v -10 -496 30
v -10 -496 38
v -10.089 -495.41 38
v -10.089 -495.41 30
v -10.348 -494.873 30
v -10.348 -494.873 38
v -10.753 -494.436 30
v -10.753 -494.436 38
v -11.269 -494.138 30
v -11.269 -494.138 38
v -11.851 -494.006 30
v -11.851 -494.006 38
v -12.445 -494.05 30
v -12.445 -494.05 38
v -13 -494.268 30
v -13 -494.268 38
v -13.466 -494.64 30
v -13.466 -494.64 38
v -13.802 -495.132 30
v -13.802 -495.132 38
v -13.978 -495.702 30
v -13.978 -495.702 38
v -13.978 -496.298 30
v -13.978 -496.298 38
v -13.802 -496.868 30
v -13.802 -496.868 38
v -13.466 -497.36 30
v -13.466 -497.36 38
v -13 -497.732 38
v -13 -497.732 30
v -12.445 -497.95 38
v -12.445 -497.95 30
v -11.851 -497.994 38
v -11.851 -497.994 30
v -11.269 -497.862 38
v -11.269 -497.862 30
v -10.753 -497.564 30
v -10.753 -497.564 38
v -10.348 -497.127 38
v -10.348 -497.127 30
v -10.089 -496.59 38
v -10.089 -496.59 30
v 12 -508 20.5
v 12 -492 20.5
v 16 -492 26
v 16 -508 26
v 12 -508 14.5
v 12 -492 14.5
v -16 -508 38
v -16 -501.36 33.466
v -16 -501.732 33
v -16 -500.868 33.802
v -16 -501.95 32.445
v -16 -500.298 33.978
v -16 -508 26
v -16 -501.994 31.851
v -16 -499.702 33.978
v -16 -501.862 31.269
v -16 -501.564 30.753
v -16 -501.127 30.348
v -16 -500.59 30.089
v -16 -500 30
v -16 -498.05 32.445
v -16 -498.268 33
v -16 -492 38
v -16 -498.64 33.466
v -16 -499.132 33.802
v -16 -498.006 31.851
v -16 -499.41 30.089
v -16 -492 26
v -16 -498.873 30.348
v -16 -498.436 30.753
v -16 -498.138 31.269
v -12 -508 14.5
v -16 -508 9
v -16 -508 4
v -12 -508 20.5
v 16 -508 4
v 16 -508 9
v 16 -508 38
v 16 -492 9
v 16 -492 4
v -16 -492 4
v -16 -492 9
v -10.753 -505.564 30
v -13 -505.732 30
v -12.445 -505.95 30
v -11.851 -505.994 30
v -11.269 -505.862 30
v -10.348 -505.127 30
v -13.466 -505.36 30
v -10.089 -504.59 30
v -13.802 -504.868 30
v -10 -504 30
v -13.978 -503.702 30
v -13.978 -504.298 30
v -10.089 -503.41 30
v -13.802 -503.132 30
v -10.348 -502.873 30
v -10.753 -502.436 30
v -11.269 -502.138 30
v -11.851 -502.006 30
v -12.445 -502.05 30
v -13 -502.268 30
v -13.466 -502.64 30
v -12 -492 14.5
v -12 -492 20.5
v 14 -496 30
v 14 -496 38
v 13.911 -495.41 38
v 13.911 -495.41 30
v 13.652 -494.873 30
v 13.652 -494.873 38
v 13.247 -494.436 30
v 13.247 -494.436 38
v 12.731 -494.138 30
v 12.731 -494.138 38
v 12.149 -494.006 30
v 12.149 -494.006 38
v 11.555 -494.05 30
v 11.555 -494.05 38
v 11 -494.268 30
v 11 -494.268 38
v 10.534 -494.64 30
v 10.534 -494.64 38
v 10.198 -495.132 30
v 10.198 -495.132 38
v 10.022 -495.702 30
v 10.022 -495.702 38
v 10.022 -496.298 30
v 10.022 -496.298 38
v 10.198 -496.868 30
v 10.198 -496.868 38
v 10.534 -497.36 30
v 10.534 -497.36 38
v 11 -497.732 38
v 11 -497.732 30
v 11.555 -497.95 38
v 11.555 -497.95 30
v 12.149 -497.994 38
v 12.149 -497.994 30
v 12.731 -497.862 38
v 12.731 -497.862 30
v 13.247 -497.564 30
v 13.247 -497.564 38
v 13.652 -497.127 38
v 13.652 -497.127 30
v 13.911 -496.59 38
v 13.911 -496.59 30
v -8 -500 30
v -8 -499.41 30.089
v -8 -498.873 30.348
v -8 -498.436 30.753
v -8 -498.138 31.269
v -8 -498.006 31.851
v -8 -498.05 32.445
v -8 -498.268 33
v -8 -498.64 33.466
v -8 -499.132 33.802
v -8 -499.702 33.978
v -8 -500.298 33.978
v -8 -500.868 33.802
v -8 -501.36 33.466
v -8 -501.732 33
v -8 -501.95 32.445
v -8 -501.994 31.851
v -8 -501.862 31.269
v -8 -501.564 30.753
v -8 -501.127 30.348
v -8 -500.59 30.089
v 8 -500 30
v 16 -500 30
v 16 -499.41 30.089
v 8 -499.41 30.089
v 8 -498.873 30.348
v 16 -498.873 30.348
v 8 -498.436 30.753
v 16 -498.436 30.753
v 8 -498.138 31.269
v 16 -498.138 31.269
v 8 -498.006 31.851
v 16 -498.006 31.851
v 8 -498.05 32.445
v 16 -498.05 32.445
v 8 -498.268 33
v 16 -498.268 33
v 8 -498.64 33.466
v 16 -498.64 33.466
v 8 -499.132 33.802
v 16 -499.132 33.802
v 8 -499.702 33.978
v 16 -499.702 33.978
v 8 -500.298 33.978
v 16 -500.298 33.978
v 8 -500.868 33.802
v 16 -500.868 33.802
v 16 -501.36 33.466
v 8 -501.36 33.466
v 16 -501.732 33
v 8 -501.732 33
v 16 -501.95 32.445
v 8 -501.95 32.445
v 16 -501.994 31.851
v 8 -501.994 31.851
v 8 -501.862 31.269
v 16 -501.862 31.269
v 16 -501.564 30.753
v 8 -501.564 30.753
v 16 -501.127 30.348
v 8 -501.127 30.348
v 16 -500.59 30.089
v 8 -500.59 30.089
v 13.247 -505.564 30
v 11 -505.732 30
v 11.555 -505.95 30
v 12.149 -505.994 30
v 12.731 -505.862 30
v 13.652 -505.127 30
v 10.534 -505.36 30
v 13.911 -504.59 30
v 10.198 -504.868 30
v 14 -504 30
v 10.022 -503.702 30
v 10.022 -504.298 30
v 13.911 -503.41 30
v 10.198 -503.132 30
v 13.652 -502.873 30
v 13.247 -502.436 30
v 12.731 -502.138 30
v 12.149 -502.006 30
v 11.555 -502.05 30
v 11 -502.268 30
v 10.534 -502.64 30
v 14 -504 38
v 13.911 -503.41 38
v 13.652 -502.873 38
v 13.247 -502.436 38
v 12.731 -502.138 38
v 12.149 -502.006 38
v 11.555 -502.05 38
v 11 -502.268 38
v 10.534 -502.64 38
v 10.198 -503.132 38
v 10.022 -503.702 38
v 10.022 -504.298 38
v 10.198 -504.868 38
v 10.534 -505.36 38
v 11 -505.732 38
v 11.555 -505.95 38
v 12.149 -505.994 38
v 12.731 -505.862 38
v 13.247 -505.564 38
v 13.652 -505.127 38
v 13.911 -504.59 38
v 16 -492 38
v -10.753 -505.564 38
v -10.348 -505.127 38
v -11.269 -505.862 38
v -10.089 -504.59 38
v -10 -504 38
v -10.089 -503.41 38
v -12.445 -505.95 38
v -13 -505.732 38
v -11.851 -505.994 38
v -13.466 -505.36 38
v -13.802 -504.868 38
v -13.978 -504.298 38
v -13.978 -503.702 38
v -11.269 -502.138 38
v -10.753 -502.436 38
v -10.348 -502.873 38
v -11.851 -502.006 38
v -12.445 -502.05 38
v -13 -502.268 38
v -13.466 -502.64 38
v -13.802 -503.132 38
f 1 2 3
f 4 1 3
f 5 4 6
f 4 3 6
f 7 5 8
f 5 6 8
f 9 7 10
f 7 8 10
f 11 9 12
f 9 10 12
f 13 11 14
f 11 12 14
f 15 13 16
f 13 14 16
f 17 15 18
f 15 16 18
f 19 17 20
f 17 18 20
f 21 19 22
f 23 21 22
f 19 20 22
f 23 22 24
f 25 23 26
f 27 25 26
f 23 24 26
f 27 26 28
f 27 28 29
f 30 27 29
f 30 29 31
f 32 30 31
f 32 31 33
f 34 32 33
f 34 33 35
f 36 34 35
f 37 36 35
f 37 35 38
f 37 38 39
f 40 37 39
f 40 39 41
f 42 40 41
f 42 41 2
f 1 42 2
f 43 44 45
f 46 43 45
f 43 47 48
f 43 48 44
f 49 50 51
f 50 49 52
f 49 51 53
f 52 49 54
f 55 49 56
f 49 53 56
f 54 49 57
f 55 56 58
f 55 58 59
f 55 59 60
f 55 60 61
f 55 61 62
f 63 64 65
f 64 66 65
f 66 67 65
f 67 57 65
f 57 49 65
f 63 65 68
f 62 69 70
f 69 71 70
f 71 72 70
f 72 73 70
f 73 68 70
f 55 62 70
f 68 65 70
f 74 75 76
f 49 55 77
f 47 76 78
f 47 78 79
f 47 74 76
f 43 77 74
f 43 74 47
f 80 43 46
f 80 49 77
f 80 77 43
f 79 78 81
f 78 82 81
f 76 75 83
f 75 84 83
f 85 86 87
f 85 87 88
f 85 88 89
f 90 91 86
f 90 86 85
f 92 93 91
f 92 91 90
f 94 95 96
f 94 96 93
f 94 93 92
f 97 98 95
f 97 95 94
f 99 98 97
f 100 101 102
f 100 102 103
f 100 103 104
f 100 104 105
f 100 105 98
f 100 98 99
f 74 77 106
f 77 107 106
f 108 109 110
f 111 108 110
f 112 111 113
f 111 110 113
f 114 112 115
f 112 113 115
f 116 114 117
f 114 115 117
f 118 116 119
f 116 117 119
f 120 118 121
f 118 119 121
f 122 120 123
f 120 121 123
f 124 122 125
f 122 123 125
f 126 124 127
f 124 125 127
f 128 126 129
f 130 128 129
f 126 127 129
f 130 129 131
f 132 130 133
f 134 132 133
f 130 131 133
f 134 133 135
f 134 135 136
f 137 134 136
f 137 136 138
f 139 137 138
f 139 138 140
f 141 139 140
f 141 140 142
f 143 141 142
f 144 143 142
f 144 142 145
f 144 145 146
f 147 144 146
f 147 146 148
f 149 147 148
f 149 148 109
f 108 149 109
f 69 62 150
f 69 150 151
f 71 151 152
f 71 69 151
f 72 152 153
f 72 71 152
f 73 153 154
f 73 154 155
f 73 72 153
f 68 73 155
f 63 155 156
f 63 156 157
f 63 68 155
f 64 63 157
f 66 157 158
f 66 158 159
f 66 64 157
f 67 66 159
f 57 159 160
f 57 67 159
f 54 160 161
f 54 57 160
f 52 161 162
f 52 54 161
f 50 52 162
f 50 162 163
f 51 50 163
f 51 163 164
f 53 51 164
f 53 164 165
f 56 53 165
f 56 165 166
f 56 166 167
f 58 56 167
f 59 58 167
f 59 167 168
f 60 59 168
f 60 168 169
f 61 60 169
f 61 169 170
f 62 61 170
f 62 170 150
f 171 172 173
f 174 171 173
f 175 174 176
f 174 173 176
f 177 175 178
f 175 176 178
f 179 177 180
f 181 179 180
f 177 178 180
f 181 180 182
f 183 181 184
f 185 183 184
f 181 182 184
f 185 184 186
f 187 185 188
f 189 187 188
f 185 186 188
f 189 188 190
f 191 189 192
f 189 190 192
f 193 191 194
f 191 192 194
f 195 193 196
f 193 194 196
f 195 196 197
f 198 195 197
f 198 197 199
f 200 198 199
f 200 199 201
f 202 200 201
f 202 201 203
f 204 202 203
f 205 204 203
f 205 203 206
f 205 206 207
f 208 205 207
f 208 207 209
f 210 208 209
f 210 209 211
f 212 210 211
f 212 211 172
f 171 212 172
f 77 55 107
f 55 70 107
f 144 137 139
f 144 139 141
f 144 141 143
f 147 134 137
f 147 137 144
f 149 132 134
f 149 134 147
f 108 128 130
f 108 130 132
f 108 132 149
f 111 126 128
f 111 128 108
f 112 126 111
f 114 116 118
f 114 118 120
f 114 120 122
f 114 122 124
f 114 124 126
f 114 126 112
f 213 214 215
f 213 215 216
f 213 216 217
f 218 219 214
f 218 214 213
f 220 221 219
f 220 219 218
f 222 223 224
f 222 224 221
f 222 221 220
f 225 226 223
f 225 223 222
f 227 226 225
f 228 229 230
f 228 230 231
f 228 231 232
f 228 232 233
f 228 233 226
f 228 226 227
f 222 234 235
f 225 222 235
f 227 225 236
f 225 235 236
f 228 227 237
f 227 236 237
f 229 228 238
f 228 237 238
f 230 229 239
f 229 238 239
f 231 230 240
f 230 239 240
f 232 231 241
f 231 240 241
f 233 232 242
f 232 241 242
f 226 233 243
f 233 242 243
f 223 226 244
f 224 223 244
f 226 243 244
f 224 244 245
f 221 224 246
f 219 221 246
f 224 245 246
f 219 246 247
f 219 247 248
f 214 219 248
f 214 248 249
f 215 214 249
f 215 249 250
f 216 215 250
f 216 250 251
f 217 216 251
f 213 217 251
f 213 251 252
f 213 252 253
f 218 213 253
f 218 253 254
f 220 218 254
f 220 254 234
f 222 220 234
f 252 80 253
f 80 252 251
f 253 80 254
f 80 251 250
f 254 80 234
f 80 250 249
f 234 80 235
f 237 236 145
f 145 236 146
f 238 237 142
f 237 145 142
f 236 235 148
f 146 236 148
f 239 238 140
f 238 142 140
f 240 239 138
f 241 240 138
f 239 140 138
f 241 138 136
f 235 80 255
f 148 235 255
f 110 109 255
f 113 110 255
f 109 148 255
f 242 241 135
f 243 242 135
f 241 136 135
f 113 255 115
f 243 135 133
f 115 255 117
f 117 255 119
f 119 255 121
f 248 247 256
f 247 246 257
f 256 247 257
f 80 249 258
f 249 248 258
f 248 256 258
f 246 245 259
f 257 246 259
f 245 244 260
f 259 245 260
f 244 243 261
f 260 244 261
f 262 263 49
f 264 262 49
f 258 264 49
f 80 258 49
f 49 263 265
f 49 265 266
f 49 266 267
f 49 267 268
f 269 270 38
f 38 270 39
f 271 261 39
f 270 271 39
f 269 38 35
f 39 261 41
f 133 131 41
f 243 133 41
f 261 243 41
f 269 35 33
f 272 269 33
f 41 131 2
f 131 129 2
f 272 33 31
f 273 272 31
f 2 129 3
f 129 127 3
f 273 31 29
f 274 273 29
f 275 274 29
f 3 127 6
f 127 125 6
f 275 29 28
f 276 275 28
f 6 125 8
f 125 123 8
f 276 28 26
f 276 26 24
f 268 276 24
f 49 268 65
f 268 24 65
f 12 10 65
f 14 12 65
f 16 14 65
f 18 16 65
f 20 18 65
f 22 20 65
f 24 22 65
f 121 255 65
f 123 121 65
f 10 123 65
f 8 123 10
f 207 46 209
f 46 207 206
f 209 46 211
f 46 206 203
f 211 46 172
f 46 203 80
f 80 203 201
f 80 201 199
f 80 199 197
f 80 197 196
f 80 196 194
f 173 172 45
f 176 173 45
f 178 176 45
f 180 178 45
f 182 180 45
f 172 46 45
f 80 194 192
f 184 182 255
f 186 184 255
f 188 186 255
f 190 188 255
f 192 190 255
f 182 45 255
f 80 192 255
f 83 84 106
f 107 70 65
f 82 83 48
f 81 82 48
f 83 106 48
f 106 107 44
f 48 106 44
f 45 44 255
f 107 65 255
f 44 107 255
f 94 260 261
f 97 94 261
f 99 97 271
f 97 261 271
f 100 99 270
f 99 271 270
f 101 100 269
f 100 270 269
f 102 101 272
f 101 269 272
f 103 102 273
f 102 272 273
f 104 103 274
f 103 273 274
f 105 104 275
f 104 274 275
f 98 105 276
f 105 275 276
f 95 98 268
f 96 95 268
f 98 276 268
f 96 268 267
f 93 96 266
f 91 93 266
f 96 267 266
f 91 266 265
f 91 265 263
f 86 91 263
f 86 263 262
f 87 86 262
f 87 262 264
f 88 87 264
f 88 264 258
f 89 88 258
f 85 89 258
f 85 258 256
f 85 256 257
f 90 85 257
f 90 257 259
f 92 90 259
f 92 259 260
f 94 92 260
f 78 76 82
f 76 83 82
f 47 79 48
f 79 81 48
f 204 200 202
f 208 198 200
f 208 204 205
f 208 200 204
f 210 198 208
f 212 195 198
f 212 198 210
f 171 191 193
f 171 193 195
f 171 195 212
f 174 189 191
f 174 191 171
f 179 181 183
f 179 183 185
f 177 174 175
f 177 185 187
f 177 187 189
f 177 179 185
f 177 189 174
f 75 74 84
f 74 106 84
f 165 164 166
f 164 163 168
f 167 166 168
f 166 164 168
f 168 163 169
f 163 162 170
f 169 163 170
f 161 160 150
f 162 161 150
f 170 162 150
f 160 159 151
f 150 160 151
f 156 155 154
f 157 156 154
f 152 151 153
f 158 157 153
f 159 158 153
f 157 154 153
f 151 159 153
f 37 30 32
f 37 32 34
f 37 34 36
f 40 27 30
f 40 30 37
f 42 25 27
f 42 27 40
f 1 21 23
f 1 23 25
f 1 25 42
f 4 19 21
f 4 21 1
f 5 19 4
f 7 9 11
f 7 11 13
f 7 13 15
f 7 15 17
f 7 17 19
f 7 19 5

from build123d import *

# Parameters (mm, degrees)
PAD026_DEPTH            = 8
SKETCH051_R             = 2
POCKET019_DEPTH         = 8
SKETCH052_R             = 2
POCKET020_DEPTH         = 8
BODY020_PLACEMENT_ANGLE = 180


with BuildPart() as part:
    # Sketch050 → Pad026 (new body, symmetric)
    with BuildSketch(Plane.XZ):
        Polygon((-16, 38), (16, 38), (16, 26), (12, 20.5), (12, 14.5), (16, 9), (16, 4), (-16, 4), (-16, 9), (-12, 14.5), (-12, 20.5), (-16, 26), align=None)
    extrude(amount=PAD026_DEPTH, both=True)

    # Sketch051 (on Face1 of Pad026) → Pocket019 (cut)
    with BuildSketch(Plane(origin=(0, 0, 38), x_dir=(-1, 0, 0), z_dir=(0, 0, 1))):
        with Locations((-12, 4)):
            Circle(SKETCH051_R)
        with Locations((-12, -4)):
            Circle(SKETCH051_R)
        with Locations((12, -4)):
            Circle(SKETCH051_R)
        with Locations((12, 4)):
            Circle(SKETCH051_R)
    extrude(amount=-POCKET019_DEPTH, mode=Mode.SUBTRACT)

    # Sketch052 (on Face2 of Pocket019) → Pocket020 (cut)
    with BuildSketch(Plane(origin=(-16, 0, 0), x_dir=(0, 0, -1), z_dir=(-1, 0, 0))):
        with Locations((-32, 0)):
            Circle(SKETCH052_R)
    pocket020 = extrude(amount=-POCKET020_DEPTH, mode=Mode.SUBTRACT)

    # Mirrored001: Pocket020 across YZ
    add(pocket020.mirror(Plane.YZ), mode=Mode.SUBTRACT)


with BuildPart() as part_1:
    # Body020 placement: moved
    add(part.part.moved(Location((0, -500, 0))).rotate(Axis((0, -500, 0), (0, 0, 1)), BODY020_PLACEMENT_ANGLE))


solid = part_1.part
